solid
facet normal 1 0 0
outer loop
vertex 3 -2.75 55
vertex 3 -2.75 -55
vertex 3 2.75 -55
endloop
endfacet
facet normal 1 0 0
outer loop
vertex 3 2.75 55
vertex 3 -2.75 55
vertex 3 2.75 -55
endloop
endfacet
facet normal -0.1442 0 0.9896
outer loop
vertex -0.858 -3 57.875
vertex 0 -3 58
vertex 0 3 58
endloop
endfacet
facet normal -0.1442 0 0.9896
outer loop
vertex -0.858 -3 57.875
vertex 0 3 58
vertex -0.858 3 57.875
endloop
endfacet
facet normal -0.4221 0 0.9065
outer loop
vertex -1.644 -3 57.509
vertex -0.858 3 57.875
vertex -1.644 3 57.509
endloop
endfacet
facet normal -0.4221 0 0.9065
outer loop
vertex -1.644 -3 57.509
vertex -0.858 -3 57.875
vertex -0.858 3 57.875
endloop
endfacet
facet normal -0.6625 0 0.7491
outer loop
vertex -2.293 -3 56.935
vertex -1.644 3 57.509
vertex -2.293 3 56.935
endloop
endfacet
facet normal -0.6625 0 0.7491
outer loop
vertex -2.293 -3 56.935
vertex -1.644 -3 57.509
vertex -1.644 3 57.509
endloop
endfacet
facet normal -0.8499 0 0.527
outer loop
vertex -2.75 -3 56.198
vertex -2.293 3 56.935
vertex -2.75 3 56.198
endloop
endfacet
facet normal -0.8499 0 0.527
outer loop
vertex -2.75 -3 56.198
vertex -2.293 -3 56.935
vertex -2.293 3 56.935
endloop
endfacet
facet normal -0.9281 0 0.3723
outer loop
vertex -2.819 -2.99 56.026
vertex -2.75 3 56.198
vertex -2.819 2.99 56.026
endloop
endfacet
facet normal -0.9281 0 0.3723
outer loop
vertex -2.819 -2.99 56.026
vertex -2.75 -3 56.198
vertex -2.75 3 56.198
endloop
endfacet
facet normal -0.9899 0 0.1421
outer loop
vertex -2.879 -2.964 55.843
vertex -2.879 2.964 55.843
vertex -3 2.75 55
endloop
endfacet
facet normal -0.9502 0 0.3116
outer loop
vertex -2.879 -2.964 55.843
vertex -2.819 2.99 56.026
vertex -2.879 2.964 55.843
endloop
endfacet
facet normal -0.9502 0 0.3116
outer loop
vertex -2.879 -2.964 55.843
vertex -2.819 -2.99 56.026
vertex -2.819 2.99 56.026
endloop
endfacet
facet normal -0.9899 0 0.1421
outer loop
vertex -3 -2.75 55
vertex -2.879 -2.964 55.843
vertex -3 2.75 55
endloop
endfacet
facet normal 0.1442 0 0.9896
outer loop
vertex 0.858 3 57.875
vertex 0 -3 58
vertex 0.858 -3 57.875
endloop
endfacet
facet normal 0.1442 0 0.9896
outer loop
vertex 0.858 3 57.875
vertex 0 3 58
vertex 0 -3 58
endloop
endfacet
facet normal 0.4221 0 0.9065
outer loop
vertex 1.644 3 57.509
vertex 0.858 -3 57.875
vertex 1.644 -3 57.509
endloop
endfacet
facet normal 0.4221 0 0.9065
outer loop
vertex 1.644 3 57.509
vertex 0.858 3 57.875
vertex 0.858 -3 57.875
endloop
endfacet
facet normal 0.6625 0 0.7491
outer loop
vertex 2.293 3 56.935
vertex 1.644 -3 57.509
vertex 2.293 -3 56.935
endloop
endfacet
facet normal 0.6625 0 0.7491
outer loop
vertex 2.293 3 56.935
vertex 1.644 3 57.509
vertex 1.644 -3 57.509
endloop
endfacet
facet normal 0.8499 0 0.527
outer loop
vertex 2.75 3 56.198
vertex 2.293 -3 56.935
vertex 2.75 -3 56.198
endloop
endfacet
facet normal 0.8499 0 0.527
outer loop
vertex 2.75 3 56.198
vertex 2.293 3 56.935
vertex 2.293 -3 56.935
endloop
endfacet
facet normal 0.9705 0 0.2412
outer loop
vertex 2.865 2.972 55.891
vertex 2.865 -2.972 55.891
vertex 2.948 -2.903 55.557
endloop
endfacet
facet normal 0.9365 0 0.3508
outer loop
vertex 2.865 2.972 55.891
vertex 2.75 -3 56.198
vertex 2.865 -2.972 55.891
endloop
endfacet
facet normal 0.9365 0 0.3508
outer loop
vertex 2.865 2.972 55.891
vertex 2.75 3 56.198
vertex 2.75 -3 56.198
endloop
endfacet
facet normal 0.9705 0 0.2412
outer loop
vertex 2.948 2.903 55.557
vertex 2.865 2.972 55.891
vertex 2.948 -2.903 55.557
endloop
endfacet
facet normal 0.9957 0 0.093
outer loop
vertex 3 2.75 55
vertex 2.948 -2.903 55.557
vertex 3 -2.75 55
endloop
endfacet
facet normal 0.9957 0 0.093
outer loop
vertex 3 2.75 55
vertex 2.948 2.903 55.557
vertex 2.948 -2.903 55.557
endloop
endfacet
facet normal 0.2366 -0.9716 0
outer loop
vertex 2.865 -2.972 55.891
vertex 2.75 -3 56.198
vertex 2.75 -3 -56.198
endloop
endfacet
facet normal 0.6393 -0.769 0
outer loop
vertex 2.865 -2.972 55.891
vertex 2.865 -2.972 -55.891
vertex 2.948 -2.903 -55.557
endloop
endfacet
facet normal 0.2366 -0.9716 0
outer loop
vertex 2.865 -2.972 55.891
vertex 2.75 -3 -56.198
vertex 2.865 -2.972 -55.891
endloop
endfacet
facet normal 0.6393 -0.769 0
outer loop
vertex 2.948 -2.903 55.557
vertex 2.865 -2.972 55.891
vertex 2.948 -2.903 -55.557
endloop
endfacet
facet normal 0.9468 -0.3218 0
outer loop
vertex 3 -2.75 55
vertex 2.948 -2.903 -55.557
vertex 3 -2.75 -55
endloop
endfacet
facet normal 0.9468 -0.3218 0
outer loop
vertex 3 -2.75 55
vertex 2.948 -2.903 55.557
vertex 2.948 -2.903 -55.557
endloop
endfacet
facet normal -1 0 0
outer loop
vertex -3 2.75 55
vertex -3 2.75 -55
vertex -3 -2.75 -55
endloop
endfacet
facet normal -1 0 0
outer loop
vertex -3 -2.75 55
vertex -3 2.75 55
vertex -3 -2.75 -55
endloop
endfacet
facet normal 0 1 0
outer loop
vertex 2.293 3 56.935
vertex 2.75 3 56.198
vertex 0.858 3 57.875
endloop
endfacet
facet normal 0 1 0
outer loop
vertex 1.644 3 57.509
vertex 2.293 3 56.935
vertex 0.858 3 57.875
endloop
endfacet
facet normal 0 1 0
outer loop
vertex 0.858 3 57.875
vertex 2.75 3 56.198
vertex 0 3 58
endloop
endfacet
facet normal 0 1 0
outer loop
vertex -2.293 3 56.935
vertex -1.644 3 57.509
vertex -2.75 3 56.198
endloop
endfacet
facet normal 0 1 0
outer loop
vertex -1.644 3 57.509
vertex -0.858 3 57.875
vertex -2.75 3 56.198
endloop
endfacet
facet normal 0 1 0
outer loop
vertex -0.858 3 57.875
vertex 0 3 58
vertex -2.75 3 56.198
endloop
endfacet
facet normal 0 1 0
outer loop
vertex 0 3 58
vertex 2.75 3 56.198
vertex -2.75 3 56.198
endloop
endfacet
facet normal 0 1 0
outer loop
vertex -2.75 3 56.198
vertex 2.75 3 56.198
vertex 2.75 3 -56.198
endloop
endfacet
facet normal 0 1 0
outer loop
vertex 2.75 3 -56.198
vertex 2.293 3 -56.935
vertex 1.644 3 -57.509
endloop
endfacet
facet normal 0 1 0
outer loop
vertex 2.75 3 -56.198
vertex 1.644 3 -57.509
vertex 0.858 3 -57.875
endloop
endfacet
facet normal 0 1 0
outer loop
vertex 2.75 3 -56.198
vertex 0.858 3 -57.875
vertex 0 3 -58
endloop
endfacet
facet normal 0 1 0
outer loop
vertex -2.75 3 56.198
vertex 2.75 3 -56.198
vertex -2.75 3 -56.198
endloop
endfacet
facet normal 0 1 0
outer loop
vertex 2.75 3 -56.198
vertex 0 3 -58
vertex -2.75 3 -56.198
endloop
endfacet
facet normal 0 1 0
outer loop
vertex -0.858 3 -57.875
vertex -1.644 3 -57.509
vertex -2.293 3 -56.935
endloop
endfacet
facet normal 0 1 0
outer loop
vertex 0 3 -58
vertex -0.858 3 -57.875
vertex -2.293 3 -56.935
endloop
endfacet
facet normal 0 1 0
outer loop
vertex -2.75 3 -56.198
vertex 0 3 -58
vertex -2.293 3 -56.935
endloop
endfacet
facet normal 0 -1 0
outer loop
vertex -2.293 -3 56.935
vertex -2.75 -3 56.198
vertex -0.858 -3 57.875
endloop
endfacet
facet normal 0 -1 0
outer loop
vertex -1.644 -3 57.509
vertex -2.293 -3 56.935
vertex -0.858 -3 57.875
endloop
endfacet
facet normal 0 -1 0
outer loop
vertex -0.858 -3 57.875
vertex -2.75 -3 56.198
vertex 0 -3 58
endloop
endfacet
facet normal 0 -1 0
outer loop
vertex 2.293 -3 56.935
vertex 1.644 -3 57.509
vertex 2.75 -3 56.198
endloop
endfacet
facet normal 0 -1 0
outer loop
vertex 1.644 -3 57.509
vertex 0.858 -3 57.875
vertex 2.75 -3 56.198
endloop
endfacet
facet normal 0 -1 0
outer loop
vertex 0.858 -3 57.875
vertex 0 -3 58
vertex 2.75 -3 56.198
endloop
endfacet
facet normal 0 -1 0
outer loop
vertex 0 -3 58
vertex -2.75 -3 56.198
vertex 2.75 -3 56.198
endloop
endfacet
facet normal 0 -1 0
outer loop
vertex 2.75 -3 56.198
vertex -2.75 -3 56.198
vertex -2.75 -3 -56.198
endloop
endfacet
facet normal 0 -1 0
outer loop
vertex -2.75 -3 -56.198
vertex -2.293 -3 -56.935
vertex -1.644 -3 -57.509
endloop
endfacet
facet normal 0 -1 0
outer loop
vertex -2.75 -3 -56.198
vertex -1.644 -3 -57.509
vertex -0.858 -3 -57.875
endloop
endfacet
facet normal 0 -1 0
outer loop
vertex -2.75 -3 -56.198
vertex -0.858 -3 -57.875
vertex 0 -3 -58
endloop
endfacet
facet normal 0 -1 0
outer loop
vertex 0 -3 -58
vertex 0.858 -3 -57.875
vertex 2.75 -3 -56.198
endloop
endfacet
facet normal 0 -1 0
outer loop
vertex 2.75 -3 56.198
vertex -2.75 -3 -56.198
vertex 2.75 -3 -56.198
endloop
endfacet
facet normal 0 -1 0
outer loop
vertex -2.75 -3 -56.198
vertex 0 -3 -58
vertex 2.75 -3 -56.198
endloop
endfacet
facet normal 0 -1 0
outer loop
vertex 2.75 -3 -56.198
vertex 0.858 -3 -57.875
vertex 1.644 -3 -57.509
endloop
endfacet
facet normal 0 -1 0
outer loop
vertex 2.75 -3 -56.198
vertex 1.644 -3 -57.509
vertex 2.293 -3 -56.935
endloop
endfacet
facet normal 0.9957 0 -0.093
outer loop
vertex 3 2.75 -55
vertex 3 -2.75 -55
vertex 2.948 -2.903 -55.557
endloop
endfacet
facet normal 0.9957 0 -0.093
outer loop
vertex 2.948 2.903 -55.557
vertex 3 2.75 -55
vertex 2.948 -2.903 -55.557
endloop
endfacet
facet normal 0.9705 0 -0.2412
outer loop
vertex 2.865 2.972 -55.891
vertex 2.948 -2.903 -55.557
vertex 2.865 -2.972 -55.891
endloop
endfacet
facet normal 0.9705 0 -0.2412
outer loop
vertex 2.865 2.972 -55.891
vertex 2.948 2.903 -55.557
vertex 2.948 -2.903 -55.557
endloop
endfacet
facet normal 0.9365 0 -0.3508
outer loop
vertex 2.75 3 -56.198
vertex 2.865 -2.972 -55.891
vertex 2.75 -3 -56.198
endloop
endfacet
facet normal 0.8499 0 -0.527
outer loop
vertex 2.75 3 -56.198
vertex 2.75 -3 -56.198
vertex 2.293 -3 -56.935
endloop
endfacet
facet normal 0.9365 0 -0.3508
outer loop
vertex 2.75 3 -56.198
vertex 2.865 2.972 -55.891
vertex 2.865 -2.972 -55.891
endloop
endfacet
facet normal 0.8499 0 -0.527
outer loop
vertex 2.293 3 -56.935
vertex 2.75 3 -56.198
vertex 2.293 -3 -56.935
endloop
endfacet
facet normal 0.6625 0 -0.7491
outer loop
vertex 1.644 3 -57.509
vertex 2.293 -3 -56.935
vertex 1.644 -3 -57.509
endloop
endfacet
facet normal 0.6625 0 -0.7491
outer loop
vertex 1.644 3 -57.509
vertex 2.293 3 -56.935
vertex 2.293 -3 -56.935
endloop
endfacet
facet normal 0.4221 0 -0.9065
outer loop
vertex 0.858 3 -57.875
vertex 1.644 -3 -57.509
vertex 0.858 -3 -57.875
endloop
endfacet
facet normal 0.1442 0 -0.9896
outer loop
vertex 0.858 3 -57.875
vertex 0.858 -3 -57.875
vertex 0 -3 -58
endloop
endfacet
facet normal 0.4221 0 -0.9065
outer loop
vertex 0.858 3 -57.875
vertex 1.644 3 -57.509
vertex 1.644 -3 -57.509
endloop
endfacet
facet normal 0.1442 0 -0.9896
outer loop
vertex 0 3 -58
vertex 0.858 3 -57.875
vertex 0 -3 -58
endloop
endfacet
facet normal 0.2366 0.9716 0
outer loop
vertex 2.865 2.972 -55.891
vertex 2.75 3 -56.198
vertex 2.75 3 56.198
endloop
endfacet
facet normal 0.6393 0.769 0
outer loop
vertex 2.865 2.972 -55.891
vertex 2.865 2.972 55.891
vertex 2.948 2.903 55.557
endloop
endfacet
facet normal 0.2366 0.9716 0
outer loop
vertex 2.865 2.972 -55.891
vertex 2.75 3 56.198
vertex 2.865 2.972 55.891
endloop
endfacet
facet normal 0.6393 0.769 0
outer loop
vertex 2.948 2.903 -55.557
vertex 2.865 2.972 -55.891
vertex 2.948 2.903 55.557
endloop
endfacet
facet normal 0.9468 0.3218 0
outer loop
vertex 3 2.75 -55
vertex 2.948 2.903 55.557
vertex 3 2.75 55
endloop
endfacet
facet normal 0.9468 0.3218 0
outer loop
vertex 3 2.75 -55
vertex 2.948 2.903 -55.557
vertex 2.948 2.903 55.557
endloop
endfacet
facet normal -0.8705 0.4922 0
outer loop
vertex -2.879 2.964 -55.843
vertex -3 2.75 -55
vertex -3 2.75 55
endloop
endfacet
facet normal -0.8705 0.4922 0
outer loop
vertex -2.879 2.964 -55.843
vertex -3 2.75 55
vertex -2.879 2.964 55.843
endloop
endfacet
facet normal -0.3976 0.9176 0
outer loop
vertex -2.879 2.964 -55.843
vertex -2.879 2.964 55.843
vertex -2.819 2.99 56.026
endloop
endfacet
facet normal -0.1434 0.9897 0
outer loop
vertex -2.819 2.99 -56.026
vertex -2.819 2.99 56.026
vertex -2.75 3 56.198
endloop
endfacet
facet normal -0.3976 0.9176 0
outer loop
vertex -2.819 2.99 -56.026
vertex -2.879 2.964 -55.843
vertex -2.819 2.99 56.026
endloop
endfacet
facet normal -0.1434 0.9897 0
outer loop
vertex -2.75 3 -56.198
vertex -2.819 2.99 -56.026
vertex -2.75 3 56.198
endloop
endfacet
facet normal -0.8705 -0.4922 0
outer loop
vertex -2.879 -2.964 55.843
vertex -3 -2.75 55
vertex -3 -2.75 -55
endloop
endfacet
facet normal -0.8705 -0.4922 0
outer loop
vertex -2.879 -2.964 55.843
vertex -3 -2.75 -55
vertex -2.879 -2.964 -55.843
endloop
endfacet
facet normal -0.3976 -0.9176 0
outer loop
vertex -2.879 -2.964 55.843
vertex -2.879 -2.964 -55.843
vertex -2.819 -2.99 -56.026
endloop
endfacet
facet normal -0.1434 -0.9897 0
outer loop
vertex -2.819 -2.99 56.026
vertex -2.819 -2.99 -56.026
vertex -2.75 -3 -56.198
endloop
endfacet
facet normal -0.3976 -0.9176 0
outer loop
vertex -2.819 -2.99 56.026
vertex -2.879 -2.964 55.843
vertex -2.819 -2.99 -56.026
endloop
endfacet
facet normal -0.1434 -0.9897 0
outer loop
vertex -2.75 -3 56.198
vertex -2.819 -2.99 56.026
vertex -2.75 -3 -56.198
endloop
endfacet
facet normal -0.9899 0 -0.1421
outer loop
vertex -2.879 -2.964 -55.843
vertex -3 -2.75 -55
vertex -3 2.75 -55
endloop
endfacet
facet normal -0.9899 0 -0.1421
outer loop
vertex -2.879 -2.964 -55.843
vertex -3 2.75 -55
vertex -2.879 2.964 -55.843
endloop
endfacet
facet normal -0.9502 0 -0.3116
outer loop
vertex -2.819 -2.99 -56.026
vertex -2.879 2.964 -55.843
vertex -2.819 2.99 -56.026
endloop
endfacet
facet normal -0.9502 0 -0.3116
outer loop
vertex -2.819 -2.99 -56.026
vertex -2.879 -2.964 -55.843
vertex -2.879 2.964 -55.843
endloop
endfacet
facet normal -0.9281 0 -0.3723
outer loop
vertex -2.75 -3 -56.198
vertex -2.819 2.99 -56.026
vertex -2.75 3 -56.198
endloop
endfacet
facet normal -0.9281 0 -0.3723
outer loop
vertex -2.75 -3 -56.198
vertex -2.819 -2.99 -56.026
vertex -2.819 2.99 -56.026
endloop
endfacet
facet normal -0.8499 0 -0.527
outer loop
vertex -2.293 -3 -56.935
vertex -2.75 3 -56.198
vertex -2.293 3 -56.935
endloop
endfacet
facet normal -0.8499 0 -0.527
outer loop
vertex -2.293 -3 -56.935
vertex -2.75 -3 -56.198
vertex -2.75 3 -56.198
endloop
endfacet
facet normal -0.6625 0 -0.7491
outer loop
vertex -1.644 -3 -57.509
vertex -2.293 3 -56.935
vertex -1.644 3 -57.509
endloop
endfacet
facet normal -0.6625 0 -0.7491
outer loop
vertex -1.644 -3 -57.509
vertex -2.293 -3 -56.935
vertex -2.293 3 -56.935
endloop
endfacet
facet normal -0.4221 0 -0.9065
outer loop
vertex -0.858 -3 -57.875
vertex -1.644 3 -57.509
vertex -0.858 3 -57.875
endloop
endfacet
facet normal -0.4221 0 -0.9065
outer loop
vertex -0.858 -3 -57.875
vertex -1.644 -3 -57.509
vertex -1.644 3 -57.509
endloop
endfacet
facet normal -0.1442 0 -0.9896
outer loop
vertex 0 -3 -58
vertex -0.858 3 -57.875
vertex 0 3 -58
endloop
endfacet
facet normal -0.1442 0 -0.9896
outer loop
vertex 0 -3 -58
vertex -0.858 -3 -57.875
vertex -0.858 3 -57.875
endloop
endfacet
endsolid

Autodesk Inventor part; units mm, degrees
ref_plane "YZ Plane" through (0, 0, 0) normal (1, 0, 0) x (0, 1, 0)
ref_plane "XZ Plane" through (0, 0, 0) normal (0, 1, 0) x (-1, 0, 0)
ref_plane "XY Plane" through (0, 0, 0) normal (0, 0, 1) x (1, 0, 0)
sketch "Sketch2" plane through (0, 0, 0) normal (0, 0, 1) x (1, 0, 0)
  line L0 (-3, -3) -> (3, -3)
  line L1 (3, -3) -> (3, 3)
  line L2 (3, 3) -> (-3, 3)
  line L3 (-3, 3) -> (-3, -3)
  line L4 (-3, -3) -> (3, 3) construction
  line L5 (3, -3) -> (-3, 3) construction
  point P0 (0, 0)
  dimension "d5" = 6
  dimension "d6" = 6
extrude "Extrusion1" add sketch "Sketch2" along normal mid plane 116
fillet "Fillet1" radius 3 4 edges at (3, 0, 58) (-3, 0, 58) (3, 0, -58) (-3, 0, -58)
fillet "Fillet1" radius 0.25 4 edges at (3, 3, 0) (-3, 3, 0) (3, -3, 0) (-3, -3, 0)
properties part number "WheelKey" material "Steel, Alloy"
